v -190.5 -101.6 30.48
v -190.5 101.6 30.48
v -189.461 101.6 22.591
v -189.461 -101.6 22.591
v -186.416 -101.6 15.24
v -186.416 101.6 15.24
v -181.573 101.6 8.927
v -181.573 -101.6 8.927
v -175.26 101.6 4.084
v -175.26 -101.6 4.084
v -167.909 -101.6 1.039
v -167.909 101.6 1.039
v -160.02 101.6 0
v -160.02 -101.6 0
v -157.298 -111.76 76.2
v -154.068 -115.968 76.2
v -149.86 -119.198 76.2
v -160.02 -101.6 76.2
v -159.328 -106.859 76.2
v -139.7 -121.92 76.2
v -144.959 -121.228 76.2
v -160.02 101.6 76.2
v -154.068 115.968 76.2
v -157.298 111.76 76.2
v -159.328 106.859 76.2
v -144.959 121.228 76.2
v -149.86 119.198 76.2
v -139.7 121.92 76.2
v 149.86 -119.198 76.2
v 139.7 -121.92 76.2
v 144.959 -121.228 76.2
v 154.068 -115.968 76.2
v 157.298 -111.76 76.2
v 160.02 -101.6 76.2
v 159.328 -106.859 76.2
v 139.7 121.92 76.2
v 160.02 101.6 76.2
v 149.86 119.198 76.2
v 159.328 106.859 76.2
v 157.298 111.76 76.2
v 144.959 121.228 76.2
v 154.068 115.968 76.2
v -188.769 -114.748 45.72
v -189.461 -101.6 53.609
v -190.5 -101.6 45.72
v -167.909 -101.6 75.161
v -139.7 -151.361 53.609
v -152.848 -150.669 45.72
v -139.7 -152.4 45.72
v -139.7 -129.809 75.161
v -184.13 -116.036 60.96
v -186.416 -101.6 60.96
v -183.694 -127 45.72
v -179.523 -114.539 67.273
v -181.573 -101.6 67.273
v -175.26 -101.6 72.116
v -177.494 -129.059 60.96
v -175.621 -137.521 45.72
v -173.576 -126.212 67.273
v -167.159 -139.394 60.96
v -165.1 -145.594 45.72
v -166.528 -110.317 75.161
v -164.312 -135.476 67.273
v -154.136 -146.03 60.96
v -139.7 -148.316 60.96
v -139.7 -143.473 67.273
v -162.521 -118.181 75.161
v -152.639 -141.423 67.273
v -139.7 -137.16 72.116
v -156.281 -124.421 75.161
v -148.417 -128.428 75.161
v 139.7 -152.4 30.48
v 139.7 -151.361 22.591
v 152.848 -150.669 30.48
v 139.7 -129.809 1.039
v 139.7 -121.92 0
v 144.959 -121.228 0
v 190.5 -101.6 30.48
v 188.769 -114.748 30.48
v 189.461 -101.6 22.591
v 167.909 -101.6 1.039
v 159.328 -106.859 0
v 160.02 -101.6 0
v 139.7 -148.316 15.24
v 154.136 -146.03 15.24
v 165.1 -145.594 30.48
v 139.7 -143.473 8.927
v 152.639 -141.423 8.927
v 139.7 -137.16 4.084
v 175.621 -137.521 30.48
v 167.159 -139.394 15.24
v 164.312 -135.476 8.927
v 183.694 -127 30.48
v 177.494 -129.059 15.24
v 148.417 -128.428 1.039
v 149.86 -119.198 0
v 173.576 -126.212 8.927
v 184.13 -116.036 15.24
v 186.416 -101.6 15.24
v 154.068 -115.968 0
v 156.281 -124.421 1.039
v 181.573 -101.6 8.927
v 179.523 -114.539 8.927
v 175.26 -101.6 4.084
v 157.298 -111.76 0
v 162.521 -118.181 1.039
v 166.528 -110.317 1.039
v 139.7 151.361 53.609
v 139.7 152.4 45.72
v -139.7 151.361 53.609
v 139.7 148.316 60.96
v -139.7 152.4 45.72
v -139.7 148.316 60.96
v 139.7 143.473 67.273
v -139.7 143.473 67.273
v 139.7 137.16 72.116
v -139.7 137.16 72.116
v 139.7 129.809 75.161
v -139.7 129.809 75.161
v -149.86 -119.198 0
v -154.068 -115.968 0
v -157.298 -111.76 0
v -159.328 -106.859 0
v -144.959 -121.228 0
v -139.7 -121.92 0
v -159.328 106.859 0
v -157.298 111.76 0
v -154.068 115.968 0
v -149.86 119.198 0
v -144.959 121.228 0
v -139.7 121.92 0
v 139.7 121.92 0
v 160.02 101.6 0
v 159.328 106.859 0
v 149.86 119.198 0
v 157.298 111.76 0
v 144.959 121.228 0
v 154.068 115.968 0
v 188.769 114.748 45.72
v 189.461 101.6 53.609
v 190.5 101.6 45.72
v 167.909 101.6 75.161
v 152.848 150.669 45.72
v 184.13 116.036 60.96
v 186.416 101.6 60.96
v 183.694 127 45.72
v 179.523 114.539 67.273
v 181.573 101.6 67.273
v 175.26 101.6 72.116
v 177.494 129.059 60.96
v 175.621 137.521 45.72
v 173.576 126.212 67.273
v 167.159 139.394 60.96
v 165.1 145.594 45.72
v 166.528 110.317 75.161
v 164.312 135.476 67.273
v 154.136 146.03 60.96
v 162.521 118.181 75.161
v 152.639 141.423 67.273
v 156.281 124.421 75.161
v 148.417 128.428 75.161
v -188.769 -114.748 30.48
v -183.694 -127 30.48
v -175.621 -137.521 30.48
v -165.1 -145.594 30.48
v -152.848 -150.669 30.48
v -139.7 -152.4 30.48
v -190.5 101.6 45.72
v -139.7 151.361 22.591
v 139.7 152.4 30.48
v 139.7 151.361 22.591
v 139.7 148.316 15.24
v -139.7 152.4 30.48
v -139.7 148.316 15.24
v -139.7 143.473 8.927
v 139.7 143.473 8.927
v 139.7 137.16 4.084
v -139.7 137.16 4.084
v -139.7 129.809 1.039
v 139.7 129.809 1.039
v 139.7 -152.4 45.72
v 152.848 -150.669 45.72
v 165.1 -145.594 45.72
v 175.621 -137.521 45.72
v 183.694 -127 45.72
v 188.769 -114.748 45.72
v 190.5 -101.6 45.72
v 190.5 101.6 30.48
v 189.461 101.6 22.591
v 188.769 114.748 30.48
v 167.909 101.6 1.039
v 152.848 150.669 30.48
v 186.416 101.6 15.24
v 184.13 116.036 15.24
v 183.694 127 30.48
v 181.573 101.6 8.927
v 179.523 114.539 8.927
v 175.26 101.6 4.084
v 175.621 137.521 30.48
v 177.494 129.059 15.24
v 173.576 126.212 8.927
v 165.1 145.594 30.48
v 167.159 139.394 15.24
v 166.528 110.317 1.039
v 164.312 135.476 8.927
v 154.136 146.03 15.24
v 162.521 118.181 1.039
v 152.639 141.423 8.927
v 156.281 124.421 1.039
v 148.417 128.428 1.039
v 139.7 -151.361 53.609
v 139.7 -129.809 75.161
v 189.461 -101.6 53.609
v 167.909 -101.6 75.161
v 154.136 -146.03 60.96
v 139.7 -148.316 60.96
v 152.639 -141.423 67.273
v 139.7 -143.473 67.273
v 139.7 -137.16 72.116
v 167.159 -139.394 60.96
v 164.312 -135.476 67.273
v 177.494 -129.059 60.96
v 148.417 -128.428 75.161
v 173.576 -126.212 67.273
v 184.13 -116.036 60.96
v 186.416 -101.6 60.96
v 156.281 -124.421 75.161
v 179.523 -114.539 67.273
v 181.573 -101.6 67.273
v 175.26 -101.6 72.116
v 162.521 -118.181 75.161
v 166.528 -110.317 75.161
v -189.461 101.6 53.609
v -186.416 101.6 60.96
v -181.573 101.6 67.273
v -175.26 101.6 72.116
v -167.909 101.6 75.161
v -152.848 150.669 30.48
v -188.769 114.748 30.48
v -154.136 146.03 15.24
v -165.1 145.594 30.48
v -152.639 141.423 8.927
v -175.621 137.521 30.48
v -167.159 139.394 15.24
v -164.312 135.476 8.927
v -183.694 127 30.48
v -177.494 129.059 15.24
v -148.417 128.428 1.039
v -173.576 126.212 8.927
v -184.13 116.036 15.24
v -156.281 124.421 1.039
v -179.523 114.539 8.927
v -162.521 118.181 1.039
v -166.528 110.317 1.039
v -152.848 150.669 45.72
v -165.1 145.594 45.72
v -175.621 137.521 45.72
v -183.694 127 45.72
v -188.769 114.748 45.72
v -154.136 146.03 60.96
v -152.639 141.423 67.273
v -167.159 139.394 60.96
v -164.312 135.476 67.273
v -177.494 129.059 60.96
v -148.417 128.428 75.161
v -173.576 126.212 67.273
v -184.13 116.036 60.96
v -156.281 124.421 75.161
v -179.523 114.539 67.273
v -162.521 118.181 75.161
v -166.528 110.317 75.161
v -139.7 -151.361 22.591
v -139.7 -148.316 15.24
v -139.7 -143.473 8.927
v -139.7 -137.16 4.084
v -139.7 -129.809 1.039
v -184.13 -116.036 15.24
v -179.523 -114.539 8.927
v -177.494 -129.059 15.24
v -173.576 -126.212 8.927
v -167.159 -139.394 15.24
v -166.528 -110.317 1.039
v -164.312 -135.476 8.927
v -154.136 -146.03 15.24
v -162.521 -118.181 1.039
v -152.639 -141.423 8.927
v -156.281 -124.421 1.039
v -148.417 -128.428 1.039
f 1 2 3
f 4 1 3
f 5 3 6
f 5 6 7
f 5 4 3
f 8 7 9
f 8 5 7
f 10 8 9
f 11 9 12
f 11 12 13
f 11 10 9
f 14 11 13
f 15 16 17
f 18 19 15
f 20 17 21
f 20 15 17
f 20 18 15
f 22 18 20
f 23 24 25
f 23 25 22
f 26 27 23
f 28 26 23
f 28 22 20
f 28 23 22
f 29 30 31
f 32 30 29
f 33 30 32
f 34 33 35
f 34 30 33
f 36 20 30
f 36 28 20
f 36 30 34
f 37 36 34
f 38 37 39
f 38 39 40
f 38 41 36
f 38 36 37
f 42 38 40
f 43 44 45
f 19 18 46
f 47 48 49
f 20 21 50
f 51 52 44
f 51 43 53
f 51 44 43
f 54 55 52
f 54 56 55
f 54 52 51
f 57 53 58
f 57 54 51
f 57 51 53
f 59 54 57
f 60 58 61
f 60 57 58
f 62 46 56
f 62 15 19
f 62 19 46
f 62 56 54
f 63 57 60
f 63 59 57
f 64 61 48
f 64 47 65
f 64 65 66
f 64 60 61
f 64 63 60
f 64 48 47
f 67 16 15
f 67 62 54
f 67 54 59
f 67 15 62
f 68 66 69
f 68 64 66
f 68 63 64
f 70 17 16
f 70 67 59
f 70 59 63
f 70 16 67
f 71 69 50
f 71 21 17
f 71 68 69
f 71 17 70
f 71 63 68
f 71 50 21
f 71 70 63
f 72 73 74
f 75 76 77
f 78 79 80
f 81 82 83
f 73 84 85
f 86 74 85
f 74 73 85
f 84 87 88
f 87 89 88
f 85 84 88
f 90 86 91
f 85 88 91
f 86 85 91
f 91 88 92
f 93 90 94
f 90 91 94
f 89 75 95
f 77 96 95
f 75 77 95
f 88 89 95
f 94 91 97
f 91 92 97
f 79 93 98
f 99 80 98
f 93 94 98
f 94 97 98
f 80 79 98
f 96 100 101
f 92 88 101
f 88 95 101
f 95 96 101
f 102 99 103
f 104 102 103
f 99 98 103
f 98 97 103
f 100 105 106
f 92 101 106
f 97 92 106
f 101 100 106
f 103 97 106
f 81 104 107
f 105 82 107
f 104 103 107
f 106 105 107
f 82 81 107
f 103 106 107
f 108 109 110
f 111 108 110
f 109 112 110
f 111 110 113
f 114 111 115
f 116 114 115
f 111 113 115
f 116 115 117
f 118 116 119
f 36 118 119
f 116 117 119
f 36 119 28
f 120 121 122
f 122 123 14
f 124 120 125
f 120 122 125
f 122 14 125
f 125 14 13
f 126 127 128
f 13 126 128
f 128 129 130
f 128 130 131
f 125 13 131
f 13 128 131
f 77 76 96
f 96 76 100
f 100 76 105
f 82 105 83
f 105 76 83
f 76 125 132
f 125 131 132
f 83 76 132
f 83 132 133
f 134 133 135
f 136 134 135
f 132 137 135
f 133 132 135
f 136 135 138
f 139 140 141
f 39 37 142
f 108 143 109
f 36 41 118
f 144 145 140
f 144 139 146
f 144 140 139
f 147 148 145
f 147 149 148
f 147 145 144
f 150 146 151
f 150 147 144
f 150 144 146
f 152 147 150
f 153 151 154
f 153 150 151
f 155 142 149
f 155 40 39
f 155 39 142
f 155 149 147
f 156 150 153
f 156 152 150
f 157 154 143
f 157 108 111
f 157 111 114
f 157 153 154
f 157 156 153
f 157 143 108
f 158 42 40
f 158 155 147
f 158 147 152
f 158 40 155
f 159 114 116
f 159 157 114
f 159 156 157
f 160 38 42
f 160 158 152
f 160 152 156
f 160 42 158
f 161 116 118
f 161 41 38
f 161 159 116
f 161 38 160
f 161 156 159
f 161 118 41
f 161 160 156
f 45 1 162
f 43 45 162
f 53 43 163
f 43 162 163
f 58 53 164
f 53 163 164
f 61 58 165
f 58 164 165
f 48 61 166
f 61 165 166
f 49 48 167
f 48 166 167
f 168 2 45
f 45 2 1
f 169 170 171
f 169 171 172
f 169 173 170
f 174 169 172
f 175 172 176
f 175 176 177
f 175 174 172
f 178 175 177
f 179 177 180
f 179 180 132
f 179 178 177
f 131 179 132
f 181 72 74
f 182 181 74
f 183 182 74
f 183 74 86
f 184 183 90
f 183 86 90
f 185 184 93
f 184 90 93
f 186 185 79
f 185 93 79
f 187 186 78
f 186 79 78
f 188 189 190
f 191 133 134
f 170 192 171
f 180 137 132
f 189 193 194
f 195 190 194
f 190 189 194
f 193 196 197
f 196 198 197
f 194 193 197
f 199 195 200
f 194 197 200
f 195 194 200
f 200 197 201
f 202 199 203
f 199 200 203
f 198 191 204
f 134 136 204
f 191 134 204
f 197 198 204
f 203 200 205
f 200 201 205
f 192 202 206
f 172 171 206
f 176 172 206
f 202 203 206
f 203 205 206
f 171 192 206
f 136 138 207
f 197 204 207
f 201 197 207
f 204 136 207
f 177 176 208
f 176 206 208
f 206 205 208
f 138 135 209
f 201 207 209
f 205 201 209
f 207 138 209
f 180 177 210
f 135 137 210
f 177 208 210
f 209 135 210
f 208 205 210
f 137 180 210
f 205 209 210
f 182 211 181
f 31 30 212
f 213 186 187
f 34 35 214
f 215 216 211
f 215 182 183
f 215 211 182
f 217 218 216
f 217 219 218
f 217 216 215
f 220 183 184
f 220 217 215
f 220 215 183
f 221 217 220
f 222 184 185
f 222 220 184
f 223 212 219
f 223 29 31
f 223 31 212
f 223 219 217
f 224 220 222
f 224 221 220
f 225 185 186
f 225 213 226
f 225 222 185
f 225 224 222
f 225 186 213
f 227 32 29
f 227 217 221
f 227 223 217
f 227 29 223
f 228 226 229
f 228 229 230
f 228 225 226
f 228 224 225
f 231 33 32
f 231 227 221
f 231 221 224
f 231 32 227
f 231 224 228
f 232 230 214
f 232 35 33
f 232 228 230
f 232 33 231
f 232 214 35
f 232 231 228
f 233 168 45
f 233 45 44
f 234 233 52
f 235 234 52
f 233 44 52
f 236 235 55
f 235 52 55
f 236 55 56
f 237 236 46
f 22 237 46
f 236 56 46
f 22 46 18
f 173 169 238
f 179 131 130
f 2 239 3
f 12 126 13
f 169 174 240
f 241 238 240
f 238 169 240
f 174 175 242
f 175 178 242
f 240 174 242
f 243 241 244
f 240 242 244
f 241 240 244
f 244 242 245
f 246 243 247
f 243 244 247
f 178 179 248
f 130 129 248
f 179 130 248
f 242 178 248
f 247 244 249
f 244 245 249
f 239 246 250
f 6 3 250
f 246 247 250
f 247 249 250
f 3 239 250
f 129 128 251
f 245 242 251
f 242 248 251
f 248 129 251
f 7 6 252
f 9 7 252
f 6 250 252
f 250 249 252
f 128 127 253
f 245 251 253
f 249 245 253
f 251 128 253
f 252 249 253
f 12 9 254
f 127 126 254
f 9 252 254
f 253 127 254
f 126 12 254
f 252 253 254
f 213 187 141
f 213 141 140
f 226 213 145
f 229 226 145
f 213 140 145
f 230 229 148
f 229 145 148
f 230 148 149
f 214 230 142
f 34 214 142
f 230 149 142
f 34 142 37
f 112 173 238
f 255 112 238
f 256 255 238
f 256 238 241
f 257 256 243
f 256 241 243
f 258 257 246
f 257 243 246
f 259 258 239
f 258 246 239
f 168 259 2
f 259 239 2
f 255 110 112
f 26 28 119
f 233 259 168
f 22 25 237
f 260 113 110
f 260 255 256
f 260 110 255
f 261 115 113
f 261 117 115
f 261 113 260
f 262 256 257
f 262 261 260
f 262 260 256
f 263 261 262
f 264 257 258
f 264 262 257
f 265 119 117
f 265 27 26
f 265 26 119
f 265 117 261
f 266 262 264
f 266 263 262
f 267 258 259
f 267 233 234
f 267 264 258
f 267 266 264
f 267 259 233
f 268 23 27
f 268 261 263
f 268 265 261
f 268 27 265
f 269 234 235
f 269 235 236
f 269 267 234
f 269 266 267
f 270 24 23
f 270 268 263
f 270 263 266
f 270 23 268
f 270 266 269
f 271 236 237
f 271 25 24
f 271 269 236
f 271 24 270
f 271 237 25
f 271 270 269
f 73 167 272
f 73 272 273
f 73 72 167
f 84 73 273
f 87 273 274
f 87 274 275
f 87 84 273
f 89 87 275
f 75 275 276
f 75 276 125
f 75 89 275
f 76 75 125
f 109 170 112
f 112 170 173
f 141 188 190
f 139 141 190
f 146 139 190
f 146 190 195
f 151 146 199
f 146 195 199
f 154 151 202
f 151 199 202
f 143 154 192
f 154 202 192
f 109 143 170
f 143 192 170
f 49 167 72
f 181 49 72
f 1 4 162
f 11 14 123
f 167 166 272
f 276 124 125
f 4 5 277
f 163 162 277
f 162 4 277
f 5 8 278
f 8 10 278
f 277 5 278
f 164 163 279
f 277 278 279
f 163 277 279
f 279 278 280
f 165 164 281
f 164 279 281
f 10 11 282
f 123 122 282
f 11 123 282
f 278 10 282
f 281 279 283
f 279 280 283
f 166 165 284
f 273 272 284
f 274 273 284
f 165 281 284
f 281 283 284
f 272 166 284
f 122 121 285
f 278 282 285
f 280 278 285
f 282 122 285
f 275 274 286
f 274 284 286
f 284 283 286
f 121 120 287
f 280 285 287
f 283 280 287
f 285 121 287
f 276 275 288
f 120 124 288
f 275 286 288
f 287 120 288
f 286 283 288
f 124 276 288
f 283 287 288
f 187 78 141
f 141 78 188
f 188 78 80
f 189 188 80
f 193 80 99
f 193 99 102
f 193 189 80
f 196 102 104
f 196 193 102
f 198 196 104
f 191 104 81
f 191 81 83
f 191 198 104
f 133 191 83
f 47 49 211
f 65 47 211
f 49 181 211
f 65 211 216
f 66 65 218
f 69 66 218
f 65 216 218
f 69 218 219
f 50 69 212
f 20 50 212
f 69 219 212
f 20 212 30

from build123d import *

# Parameters (mm, degrees)
F1_DEPTH = 38.1
F2_R     = 30.48
F3_DEPTH = 38.1
F4_R     = 30.48


with BuildPart() as f1:
    # F0 (on Top) → F1 (new body)
    with BuildSketch(Plane.XY):
        with BuildLine():
            Line((-139.7, -152.4), (139.7, -152.4))
            ThreePointArc((139.7, -152.4), (175.6210244843, -137.5210244843), (190.5, -101.6))
            Line((190.5, -101.6), (190.5, 101.6))
            ThreePointArc((190.5, 101.6), (175.6210244843, 137.5210244843), (139.7, 152.4))
            Line((139.7, 152.4), (-139.7, 152.4))
            ThreePointArc((-139.7, 152.4), (-175.6210244843, 137.5210244843), (-190.5, 101.6))
            Line((-190.5, 101.6), (-190.5, -101.6))
            ThreePointArc((-190.5, -101.6), (-175.6210244843, -137.5210244843), (-139.7, -152.4))
        make_face()
    extrude(amount=F1_DEPTH)

    # F2
    f2_edges = [f1.edges().sort_by_distance(p)[0] for p in [
        (0, -152.4, 0),
    ]]
    fillet(f2_edges, radius=F2_R)

    # F3 (add): a face of the model
    f3_faces = [f1.faces().sort_by_distance(p)[0] for p in [
        (0, 0, 38.1),
    ]]
    extrude(f3_faces, amount=F3_DEPTH)

    # F4
    f4_edges = [f1.edges().sort_by_distance(p)[0] for p in [
        (0, -152.4, 76.2),
    ]]
    fillet(f4_edges, radius=F4_R)


solid = f1.part
